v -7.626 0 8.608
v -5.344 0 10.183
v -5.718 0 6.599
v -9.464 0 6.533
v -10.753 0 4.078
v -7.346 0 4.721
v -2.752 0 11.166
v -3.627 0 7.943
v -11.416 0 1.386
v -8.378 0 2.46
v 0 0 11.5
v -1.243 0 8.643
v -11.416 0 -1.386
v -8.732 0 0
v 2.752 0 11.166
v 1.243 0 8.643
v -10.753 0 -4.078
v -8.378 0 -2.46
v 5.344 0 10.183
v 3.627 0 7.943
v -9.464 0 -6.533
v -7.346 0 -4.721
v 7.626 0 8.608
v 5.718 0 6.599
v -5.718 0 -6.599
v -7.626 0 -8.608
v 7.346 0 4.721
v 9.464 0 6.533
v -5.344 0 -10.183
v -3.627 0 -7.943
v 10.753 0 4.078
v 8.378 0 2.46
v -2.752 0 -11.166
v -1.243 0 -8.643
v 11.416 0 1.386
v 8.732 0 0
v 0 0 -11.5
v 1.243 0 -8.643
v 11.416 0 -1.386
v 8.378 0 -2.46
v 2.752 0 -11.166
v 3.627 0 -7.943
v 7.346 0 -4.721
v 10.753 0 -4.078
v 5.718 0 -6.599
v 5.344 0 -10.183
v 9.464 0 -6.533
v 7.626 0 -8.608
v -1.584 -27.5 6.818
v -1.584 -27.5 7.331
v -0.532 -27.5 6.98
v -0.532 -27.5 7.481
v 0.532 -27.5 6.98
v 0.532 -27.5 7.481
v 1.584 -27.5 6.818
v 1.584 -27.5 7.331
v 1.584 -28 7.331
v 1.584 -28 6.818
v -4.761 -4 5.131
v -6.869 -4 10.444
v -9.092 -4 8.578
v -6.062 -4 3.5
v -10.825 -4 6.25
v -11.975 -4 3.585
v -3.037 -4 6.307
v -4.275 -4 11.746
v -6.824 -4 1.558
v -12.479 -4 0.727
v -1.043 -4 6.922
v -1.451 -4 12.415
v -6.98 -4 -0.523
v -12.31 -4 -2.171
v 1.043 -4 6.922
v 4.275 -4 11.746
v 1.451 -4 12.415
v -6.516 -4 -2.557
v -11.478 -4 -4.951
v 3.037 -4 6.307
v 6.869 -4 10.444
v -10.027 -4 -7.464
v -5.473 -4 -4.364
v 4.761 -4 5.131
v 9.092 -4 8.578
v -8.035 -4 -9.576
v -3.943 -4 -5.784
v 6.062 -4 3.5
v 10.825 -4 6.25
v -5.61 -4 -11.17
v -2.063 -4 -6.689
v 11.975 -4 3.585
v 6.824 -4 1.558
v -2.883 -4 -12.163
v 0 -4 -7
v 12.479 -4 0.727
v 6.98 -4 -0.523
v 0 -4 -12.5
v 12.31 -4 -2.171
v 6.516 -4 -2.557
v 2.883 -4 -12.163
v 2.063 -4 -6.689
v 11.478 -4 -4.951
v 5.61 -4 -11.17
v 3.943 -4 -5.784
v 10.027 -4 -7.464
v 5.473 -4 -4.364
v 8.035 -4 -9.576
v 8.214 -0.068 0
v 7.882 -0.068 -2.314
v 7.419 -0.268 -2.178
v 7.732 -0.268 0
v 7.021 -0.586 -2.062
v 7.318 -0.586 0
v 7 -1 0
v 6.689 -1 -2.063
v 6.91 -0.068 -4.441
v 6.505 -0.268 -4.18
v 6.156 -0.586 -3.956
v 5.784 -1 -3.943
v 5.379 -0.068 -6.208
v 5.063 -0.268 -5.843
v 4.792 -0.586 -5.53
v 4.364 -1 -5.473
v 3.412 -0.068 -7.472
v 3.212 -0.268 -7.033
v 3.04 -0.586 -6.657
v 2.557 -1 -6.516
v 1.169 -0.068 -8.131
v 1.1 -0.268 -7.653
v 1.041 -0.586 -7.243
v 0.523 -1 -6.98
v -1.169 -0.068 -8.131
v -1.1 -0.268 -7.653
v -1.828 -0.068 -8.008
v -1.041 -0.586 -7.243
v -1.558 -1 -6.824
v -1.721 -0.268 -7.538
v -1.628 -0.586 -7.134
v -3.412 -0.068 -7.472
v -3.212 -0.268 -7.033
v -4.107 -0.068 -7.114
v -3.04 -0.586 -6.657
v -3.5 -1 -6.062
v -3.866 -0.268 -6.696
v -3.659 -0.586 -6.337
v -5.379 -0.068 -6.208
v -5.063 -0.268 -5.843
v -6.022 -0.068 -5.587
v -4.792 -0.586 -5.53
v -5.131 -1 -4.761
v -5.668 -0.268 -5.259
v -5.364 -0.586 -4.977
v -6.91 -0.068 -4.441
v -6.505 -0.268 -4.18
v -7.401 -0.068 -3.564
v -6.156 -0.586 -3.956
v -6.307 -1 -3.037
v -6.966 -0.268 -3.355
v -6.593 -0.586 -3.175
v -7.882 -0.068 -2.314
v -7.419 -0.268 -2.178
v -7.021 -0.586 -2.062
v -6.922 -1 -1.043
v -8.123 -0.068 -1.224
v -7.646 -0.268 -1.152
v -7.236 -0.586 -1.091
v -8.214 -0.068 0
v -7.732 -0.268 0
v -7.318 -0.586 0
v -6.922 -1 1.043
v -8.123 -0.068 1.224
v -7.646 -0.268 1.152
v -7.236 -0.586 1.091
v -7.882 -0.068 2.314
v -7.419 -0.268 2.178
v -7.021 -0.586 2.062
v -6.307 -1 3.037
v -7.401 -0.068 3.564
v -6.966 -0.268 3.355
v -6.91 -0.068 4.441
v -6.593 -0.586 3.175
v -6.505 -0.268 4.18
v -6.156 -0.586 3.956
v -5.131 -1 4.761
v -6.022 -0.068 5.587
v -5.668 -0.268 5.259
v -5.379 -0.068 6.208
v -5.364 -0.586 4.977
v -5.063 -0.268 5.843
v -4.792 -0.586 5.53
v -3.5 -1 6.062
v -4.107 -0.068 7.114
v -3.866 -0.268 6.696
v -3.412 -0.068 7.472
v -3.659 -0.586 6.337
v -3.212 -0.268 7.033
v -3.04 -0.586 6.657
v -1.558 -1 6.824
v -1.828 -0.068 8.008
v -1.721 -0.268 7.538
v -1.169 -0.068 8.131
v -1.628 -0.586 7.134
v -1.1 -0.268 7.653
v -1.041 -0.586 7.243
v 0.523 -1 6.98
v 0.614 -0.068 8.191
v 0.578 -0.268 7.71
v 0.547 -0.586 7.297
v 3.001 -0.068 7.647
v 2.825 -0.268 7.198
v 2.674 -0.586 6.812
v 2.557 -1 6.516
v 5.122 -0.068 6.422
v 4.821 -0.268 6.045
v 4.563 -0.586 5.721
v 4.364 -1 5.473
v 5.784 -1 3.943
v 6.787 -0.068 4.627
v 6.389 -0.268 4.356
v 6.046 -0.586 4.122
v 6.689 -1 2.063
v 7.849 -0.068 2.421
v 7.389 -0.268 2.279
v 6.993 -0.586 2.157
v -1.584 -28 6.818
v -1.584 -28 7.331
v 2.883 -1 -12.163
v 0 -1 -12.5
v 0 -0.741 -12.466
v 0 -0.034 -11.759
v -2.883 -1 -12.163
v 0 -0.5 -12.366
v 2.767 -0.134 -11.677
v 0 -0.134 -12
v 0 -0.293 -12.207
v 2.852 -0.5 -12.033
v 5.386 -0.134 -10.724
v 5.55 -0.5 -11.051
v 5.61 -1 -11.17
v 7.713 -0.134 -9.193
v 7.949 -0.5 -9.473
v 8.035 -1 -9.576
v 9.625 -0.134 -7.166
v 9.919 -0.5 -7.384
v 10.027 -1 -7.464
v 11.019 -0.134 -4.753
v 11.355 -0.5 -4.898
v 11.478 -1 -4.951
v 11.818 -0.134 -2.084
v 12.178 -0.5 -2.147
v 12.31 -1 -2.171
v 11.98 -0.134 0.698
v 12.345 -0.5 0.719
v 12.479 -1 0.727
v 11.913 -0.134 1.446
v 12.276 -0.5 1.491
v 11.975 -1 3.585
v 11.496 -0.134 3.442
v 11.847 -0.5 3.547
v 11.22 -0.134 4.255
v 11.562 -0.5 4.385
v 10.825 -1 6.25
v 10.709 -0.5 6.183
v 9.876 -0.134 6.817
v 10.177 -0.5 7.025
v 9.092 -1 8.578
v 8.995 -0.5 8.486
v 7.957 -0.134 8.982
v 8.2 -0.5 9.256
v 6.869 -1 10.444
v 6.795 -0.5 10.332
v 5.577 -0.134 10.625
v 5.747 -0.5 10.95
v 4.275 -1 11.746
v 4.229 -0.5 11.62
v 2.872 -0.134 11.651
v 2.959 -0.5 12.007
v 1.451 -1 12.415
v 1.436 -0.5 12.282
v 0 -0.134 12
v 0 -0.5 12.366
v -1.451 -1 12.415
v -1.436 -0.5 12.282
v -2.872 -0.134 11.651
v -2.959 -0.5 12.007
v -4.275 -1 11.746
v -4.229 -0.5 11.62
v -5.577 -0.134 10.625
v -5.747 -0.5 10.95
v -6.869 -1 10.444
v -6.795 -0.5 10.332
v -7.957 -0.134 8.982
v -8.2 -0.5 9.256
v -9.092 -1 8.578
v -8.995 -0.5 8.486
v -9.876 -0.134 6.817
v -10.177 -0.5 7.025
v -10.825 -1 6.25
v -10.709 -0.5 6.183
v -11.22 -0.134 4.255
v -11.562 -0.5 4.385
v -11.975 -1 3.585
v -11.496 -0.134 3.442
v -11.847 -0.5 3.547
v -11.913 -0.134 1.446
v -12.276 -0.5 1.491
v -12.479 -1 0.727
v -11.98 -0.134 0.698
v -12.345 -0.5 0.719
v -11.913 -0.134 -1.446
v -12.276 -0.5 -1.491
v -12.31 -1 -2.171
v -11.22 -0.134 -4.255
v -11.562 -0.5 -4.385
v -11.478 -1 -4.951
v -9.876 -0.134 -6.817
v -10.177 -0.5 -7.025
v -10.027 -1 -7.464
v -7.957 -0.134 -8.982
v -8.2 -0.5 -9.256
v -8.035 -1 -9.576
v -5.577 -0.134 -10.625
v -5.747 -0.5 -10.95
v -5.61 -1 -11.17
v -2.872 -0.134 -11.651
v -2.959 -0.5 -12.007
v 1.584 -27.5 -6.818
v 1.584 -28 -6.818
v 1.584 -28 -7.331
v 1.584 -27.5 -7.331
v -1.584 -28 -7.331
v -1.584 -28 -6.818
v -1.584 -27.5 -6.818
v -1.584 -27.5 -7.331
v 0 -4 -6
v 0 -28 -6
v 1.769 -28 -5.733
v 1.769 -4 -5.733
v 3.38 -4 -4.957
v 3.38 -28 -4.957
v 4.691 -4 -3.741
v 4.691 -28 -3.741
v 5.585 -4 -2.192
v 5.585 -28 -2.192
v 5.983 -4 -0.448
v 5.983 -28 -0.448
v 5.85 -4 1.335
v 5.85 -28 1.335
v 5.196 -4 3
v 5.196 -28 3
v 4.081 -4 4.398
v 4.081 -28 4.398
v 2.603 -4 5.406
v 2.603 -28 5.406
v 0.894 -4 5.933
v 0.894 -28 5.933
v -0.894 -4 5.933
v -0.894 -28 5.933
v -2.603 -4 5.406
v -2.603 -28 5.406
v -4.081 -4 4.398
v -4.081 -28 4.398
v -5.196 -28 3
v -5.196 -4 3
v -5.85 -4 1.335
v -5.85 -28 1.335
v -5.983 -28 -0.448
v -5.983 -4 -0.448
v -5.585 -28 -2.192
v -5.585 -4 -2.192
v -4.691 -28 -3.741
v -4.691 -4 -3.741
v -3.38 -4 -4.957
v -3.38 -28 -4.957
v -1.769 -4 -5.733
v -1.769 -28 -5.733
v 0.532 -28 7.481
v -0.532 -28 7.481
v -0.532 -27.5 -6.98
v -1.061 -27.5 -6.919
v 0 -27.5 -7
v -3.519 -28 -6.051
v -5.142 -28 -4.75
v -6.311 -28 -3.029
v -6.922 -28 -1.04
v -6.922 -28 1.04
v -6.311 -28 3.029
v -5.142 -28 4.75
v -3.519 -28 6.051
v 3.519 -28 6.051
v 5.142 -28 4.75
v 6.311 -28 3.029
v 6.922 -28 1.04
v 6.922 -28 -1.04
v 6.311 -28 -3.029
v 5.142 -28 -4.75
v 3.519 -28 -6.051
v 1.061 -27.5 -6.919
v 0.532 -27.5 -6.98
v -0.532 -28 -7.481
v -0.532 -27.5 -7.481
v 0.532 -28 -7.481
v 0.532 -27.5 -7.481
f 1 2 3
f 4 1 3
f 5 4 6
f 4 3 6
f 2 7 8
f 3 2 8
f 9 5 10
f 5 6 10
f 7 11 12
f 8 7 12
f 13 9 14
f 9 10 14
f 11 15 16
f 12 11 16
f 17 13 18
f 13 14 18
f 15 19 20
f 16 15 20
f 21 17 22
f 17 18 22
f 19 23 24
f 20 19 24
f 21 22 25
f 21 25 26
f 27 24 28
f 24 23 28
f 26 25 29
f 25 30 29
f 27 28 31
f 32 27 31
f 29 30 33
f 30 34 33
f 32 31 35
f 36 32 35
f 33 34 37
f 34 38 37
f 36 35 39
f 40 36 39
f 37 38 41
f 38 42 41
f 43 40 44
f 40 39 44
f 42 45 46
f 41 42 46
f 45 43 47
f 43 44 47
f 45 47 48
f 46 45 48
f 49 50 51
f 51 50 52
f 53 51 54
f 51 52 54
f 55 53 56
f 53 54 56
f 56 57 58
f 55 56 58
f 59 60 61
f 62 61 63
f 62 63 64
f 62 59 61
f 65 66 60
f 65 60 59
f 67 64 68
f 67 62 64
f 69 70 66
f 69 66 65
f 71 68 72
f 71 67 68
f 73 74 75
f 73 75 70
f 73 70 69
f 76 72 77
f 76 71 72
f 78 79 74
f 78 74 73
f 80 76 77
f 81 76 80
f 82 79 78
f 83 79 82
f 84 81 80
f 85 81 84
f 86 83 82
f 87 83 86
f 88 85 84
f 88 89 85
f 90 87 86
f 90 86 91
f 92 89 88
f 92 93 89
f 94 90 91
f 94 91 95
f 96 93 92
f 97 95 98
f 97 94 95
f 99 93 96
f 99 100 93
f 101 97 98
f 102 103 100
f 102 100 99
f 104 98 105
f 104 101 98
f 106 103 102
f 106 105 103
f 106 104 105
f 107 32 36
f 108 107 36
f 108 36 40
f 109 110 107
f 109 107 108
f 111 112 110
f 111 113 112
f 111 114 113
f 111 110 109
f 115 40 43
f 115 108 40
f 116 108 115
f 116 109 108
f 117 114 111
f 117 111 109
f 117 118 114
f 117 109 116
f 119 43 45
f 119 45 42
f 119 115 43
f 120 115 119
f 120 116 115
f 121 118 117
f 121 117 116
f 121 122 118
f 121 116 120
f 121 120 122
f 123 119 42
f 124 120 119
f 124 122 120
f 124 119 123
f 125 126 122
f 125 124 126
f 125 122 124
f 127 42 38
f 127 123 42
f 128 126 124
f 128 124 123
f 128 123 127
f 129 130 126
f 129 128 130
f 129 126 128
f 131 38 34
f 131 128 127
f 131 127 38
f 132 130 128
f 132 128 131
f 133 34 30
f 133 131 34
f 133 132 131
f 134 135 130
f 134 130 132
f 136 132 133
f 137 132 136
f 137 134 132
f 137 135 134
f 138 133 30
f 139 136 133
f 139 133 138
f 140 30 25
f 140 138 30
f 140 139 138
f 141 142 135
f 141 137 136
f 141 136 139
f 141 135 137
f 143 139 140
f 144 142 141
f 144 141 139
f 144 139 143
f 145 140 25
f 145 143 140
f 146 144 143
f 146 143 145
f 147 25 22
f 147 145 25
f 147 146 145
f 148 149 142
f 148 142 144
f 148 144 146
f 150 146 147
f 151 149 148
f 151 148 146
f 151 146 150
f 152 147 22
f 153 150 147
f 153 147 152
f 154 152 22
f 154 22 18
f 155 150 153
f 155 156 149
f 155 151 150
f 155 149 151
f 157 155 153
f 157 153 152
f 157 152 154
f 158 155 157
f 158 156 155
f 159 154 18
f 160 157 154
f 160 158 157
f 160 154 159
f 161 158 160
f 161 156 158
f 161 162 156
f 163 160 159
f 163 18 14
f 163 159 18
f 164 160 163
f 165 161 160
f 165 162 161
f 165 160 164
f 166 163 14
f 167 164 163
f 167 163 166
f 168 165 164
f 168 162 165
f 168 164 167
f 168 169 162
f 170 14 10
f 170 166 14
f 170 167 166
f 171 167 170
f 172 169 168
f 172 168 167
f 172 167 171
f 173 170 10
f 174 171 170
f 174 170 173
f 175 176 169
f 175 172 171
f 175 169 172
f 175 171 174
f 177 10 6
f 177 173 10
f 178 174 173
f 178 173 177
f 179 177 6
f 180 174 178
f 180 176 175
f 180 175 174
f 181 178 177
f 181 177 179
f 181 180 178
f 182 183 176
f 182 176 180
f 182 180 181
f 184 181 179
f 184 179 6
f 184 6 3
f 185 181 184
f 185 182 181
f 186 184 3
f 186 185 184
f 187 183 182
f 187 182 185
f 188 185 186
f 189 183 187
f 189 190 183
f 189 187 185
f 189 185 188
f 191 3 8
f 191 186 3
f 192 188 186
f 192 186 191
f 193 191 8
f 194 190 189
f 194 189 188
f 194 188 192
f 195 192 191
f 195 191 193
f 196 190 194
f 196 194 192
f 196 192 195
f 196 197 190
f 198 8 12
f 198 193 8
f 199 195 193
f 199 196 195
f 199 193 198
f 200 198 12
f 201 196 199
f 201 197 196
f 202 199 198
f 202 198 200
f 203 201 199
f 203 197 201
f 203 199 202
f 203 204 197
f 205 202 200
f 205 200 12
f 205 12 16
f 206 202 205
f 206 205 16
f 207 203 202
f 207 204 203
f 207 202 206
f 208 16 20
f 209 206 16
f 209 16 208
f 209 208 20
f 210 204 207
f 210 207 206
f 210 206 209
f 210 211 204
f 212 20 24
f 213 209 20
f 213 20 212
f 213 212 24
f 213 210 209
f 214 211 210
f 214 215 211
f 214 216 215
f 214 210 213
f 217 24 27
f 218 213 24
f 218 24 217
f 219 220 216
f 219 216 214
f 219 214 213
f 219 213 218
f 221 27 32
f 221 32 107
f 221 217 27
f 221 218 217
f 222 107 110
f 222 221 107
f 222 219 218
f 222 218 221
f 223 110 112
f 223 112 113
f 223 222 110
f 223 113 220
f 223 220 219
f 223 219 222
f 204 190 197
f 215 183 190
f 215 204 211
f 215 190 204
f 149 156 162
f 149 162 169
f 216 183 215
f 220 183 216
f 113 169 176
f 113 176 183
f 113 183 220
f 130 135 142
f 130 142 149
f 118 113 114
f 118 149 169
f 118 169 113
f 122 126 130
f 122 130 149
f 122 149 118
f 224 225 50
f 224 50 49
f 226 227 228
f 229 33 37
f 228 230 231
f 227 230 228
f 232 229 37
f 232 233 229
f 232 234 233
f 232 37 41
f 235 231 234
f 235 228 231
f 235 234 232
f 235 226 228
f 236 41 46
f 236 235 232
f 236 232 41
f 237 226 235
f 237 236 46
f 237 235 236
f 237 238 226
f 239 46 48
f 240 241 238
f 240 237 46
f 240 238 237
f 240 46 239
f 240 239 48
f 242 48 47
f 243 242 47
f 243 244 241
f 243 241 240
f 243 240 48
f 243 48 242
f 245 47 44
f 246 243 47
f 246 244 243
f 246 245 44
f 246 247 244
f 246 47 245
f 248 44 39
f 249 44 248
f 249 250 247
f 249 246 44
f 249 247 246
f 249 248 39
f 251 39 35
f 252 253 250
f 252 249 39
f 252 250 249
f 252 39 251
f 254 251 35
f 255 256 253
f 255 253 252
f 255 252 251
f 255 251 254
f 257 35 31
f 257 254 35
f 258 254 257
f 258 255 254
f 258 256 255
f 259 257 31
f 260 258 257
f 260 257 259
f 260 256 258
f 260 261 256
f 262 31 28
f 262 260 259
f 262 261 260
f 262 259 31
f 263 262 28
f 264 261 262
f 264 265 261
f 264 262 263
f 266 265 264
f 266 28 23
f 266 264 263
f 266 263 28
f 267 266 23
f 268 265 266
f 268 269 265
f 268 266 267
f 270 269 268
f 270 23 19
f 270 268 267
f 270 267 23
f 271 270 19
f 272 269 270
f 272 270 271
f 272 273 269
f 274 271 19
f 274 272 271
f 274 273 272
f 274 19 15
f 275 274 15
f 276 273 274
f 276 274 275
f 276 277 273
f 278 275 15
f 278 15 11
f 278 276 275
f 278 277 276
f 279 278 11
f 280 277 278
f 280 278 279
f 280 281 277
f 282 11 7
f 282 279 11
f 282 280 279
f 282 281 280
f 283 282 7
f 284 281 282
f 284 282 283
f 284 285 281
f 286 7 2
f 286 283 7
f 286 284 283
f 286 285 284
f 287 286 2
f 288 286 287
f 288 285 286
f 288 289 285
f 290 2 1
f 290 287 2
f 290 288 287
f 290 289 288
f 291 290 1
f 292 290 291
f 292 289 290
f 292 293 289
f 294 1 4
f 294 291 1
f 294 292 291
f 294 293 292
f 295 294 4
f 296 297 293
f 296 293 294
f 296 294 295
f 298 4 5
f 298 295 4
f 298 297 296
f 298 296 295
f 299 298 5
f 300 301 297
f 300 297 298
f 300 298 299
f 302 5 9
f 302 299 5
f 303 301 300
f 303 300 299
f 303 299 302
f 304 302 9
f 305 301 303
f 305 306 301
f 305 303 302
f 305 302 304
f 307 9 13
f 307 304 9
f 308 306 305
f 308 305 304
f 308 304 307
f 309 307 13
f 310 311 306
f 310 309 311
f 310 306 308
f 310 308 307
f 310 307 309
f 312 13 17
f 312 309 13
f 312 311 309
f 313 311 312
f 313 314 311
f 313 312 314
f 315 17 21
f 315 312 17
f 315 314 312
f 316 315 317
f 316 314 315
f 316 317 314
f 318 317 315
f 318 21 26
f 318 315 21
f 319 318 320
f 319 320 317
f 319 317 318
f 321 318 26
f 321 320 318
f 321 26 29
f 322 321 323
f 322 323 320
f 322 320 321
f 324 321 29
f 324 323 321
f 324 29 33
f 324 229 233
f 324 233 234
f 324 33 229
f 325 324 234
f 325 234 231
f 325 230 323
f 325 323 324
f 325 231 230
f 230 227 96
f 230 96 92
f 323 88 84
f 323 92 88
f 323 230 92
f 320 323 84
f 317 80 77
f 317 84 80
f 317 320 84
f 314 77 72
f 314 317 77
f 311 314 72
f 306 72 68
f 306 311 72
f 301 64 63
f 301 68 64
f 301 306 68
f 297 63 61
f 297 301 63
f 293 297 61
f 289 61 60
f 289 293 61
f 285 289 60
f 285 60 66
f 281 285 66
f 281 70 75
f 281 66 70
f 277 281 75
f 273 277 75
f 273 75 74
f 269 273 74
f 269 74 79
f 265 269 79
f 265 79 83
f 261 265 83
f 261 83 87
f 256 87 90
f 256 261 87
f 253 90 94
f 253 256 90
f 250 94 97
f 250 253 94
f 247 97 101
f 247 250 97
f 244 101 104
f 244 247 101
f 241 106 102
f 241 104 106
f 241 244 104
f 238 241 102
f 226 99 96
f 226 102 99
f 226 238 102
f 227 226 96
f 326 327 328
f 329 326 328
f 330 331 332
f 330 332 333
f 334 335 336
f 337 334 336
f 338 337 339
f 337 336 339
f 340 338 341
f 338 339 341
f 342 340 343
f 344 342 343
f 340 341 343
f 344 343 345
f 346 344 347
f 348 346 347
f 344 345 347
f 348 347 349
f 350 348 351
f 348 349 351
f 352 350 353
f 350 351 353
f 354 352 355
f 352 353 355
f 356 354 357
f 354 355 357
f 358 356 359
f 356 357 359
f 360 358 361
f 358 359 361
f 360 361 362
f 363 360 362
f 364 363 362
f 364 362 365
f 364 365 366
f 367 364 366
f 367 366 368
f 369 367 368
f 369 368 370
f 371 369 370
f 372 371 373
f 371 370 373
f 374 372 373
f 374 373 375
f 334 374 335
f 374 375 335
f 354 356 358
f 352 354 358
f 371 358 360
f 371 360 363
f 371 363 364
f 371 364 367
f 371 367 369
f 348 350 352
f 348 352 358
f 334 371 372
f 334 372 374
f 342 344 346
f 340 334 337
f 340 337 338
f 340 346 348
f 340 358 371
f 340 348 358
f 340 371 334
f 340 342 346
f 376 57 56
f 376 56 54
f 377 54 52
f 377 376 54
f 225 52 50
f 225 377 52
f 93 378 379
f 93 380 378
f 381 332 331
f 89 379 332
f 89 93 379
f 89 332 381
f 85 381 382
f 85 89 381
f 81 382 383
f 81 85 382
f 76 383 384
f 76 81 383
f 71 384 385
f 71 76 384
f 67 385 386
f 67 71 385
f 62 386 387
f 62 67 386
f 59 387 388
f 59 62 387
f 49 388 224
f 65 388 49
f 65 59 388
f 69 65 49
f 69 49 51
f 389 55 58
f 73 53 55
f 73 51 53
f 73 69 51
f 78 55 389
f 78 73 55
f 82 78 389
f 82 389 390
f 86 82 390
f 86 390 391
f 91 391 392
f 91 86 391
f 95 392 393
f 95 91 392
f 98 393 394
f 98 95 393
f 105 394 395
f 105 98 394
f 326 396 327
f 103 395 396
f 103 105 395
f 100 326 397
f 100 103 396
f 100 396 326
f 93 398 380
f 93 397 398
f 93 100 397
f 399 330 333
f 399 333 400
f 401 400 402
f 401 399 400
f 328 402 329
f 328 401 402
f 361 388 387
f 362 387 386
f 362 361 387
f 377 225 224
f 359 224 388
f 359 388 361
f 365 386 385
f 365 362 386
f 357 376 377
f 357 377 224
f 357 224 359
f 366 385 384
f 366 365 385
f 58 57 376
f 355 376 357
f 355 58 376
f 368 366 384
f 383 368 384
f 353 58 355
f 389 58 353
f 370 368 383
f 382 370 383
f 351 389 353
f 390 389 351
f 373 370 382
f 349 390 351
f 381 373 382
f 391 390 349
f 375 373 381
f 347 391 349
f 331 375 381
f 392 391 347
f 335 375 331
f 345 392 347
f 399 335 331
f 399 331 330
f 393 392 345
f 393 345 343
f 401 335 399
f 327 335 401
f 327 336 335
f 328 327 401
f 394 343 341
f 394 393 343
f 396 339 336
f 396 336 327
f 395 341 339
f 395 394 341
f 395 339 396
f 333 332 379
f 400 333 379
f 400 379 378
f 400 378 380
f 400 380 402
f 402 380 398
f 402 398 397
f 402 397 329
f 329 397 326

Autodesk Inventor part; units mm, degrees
ref_plane "YZ Plane" through (0, 0, 0) normal (1, 0, 0) x (0, 1, 0)
ref_plane "XZ Plane" through (0, 0, 0) normal (0, 1, 0) x (-1, 0, 0)
ref_plane "XY Plane" through (0, 0, 0) normal (0, 0, 1) x (1, 0, 0)
sketch "Sketch2" plane through (0, 0, 0) normal (1, 0, 0) x (0, 1, 0)
  line L0 (0, 0) -> (-4, 0)
  line L1 (-4, 0) -> (-4, -12.5)
  line L2 (-4, -12.5) -> (0, -12.5)
  line L3 (0, -12.5) -> (0, 0)
  line L4 (12.3022, 0) -> (-32.9738, 0) construction
  line L5 (-4, 0) -> (-28, 0)
  line L6 (-28, 0) -> (-28, -7)
  line L7 (-28, -7) -> (-4, -7)
  line L8 (-4, -7) -> (-4, 0)
  line L9 (-4, -6) -> (-28, -6)
  point P0 (-4, -7)
  dimension "d0" = 4
  dimension "d2" = 25
  dimension "d3" = 28
  dimension "d4" = 1
  dimension "d5" = 14
revolve "Revolution1" add sketch "Sketch2" angle 360 about axis through (0, 12.3022, 0) along (0, -1, 0) contours L3 L2 L1 L0 | L1 L7 L6 L9
sketch "Sketch3" plane through (0, 0, 0) normal (0, 1, 0) x (1, 0, 0)
  circle A0 centre (0, 0) radius 7
  dimension "d7" = 14
extrude "Extrusion1" cut sketch "Sketch3" against normal blind 1
fillet "Fillet1" radius 2 1 edges at (-7, 0, 0)
fillet "Fillet2" radius 1 1 edges at (0, 0, 12.5)
sketch "Sketch4" plane through (0, -28, 0) normal (0, -1, 0) x (1, 0, 0)
  circle A0 centre (0, 0) radius 7 projected
  circle A1 centre (0, 0) radius 7 projected
  line L0 (1.5845, 7.3307) -> (1.5845, 6.8183)
  line L1 (1.5845, -6.8183) -> (1.5845, -7.3307)
  line L2 (-1.5845, 7.3307) -> (-1.5845, 6.8183)
  line L3 (-1.5845, -6.8183) -> (-1.5845, -7.3307)
  circle A2 centre (0, 0) radius 11.5 projected
  arc A3 (1.5845, 7.3307) -> (-1.5845, 7.3307) centre (0, 0) ccw
  arc A4 (-1.5845, -7.3307) -> (1.5845, -7.3307) centre (0, 0) ccw
  dimension "d13" = 1.5845
  dimension "d14" = 1.5845
  dimension "d15" = 1.5845
  dimension "d16" = 1.5845
extrude "Extrusion2" add sketch "Sketch4" against normal blind 0.5 contours A0 L2 A3 L0 | L1 A4 L3 A0
properties part number "BOTÃO"
